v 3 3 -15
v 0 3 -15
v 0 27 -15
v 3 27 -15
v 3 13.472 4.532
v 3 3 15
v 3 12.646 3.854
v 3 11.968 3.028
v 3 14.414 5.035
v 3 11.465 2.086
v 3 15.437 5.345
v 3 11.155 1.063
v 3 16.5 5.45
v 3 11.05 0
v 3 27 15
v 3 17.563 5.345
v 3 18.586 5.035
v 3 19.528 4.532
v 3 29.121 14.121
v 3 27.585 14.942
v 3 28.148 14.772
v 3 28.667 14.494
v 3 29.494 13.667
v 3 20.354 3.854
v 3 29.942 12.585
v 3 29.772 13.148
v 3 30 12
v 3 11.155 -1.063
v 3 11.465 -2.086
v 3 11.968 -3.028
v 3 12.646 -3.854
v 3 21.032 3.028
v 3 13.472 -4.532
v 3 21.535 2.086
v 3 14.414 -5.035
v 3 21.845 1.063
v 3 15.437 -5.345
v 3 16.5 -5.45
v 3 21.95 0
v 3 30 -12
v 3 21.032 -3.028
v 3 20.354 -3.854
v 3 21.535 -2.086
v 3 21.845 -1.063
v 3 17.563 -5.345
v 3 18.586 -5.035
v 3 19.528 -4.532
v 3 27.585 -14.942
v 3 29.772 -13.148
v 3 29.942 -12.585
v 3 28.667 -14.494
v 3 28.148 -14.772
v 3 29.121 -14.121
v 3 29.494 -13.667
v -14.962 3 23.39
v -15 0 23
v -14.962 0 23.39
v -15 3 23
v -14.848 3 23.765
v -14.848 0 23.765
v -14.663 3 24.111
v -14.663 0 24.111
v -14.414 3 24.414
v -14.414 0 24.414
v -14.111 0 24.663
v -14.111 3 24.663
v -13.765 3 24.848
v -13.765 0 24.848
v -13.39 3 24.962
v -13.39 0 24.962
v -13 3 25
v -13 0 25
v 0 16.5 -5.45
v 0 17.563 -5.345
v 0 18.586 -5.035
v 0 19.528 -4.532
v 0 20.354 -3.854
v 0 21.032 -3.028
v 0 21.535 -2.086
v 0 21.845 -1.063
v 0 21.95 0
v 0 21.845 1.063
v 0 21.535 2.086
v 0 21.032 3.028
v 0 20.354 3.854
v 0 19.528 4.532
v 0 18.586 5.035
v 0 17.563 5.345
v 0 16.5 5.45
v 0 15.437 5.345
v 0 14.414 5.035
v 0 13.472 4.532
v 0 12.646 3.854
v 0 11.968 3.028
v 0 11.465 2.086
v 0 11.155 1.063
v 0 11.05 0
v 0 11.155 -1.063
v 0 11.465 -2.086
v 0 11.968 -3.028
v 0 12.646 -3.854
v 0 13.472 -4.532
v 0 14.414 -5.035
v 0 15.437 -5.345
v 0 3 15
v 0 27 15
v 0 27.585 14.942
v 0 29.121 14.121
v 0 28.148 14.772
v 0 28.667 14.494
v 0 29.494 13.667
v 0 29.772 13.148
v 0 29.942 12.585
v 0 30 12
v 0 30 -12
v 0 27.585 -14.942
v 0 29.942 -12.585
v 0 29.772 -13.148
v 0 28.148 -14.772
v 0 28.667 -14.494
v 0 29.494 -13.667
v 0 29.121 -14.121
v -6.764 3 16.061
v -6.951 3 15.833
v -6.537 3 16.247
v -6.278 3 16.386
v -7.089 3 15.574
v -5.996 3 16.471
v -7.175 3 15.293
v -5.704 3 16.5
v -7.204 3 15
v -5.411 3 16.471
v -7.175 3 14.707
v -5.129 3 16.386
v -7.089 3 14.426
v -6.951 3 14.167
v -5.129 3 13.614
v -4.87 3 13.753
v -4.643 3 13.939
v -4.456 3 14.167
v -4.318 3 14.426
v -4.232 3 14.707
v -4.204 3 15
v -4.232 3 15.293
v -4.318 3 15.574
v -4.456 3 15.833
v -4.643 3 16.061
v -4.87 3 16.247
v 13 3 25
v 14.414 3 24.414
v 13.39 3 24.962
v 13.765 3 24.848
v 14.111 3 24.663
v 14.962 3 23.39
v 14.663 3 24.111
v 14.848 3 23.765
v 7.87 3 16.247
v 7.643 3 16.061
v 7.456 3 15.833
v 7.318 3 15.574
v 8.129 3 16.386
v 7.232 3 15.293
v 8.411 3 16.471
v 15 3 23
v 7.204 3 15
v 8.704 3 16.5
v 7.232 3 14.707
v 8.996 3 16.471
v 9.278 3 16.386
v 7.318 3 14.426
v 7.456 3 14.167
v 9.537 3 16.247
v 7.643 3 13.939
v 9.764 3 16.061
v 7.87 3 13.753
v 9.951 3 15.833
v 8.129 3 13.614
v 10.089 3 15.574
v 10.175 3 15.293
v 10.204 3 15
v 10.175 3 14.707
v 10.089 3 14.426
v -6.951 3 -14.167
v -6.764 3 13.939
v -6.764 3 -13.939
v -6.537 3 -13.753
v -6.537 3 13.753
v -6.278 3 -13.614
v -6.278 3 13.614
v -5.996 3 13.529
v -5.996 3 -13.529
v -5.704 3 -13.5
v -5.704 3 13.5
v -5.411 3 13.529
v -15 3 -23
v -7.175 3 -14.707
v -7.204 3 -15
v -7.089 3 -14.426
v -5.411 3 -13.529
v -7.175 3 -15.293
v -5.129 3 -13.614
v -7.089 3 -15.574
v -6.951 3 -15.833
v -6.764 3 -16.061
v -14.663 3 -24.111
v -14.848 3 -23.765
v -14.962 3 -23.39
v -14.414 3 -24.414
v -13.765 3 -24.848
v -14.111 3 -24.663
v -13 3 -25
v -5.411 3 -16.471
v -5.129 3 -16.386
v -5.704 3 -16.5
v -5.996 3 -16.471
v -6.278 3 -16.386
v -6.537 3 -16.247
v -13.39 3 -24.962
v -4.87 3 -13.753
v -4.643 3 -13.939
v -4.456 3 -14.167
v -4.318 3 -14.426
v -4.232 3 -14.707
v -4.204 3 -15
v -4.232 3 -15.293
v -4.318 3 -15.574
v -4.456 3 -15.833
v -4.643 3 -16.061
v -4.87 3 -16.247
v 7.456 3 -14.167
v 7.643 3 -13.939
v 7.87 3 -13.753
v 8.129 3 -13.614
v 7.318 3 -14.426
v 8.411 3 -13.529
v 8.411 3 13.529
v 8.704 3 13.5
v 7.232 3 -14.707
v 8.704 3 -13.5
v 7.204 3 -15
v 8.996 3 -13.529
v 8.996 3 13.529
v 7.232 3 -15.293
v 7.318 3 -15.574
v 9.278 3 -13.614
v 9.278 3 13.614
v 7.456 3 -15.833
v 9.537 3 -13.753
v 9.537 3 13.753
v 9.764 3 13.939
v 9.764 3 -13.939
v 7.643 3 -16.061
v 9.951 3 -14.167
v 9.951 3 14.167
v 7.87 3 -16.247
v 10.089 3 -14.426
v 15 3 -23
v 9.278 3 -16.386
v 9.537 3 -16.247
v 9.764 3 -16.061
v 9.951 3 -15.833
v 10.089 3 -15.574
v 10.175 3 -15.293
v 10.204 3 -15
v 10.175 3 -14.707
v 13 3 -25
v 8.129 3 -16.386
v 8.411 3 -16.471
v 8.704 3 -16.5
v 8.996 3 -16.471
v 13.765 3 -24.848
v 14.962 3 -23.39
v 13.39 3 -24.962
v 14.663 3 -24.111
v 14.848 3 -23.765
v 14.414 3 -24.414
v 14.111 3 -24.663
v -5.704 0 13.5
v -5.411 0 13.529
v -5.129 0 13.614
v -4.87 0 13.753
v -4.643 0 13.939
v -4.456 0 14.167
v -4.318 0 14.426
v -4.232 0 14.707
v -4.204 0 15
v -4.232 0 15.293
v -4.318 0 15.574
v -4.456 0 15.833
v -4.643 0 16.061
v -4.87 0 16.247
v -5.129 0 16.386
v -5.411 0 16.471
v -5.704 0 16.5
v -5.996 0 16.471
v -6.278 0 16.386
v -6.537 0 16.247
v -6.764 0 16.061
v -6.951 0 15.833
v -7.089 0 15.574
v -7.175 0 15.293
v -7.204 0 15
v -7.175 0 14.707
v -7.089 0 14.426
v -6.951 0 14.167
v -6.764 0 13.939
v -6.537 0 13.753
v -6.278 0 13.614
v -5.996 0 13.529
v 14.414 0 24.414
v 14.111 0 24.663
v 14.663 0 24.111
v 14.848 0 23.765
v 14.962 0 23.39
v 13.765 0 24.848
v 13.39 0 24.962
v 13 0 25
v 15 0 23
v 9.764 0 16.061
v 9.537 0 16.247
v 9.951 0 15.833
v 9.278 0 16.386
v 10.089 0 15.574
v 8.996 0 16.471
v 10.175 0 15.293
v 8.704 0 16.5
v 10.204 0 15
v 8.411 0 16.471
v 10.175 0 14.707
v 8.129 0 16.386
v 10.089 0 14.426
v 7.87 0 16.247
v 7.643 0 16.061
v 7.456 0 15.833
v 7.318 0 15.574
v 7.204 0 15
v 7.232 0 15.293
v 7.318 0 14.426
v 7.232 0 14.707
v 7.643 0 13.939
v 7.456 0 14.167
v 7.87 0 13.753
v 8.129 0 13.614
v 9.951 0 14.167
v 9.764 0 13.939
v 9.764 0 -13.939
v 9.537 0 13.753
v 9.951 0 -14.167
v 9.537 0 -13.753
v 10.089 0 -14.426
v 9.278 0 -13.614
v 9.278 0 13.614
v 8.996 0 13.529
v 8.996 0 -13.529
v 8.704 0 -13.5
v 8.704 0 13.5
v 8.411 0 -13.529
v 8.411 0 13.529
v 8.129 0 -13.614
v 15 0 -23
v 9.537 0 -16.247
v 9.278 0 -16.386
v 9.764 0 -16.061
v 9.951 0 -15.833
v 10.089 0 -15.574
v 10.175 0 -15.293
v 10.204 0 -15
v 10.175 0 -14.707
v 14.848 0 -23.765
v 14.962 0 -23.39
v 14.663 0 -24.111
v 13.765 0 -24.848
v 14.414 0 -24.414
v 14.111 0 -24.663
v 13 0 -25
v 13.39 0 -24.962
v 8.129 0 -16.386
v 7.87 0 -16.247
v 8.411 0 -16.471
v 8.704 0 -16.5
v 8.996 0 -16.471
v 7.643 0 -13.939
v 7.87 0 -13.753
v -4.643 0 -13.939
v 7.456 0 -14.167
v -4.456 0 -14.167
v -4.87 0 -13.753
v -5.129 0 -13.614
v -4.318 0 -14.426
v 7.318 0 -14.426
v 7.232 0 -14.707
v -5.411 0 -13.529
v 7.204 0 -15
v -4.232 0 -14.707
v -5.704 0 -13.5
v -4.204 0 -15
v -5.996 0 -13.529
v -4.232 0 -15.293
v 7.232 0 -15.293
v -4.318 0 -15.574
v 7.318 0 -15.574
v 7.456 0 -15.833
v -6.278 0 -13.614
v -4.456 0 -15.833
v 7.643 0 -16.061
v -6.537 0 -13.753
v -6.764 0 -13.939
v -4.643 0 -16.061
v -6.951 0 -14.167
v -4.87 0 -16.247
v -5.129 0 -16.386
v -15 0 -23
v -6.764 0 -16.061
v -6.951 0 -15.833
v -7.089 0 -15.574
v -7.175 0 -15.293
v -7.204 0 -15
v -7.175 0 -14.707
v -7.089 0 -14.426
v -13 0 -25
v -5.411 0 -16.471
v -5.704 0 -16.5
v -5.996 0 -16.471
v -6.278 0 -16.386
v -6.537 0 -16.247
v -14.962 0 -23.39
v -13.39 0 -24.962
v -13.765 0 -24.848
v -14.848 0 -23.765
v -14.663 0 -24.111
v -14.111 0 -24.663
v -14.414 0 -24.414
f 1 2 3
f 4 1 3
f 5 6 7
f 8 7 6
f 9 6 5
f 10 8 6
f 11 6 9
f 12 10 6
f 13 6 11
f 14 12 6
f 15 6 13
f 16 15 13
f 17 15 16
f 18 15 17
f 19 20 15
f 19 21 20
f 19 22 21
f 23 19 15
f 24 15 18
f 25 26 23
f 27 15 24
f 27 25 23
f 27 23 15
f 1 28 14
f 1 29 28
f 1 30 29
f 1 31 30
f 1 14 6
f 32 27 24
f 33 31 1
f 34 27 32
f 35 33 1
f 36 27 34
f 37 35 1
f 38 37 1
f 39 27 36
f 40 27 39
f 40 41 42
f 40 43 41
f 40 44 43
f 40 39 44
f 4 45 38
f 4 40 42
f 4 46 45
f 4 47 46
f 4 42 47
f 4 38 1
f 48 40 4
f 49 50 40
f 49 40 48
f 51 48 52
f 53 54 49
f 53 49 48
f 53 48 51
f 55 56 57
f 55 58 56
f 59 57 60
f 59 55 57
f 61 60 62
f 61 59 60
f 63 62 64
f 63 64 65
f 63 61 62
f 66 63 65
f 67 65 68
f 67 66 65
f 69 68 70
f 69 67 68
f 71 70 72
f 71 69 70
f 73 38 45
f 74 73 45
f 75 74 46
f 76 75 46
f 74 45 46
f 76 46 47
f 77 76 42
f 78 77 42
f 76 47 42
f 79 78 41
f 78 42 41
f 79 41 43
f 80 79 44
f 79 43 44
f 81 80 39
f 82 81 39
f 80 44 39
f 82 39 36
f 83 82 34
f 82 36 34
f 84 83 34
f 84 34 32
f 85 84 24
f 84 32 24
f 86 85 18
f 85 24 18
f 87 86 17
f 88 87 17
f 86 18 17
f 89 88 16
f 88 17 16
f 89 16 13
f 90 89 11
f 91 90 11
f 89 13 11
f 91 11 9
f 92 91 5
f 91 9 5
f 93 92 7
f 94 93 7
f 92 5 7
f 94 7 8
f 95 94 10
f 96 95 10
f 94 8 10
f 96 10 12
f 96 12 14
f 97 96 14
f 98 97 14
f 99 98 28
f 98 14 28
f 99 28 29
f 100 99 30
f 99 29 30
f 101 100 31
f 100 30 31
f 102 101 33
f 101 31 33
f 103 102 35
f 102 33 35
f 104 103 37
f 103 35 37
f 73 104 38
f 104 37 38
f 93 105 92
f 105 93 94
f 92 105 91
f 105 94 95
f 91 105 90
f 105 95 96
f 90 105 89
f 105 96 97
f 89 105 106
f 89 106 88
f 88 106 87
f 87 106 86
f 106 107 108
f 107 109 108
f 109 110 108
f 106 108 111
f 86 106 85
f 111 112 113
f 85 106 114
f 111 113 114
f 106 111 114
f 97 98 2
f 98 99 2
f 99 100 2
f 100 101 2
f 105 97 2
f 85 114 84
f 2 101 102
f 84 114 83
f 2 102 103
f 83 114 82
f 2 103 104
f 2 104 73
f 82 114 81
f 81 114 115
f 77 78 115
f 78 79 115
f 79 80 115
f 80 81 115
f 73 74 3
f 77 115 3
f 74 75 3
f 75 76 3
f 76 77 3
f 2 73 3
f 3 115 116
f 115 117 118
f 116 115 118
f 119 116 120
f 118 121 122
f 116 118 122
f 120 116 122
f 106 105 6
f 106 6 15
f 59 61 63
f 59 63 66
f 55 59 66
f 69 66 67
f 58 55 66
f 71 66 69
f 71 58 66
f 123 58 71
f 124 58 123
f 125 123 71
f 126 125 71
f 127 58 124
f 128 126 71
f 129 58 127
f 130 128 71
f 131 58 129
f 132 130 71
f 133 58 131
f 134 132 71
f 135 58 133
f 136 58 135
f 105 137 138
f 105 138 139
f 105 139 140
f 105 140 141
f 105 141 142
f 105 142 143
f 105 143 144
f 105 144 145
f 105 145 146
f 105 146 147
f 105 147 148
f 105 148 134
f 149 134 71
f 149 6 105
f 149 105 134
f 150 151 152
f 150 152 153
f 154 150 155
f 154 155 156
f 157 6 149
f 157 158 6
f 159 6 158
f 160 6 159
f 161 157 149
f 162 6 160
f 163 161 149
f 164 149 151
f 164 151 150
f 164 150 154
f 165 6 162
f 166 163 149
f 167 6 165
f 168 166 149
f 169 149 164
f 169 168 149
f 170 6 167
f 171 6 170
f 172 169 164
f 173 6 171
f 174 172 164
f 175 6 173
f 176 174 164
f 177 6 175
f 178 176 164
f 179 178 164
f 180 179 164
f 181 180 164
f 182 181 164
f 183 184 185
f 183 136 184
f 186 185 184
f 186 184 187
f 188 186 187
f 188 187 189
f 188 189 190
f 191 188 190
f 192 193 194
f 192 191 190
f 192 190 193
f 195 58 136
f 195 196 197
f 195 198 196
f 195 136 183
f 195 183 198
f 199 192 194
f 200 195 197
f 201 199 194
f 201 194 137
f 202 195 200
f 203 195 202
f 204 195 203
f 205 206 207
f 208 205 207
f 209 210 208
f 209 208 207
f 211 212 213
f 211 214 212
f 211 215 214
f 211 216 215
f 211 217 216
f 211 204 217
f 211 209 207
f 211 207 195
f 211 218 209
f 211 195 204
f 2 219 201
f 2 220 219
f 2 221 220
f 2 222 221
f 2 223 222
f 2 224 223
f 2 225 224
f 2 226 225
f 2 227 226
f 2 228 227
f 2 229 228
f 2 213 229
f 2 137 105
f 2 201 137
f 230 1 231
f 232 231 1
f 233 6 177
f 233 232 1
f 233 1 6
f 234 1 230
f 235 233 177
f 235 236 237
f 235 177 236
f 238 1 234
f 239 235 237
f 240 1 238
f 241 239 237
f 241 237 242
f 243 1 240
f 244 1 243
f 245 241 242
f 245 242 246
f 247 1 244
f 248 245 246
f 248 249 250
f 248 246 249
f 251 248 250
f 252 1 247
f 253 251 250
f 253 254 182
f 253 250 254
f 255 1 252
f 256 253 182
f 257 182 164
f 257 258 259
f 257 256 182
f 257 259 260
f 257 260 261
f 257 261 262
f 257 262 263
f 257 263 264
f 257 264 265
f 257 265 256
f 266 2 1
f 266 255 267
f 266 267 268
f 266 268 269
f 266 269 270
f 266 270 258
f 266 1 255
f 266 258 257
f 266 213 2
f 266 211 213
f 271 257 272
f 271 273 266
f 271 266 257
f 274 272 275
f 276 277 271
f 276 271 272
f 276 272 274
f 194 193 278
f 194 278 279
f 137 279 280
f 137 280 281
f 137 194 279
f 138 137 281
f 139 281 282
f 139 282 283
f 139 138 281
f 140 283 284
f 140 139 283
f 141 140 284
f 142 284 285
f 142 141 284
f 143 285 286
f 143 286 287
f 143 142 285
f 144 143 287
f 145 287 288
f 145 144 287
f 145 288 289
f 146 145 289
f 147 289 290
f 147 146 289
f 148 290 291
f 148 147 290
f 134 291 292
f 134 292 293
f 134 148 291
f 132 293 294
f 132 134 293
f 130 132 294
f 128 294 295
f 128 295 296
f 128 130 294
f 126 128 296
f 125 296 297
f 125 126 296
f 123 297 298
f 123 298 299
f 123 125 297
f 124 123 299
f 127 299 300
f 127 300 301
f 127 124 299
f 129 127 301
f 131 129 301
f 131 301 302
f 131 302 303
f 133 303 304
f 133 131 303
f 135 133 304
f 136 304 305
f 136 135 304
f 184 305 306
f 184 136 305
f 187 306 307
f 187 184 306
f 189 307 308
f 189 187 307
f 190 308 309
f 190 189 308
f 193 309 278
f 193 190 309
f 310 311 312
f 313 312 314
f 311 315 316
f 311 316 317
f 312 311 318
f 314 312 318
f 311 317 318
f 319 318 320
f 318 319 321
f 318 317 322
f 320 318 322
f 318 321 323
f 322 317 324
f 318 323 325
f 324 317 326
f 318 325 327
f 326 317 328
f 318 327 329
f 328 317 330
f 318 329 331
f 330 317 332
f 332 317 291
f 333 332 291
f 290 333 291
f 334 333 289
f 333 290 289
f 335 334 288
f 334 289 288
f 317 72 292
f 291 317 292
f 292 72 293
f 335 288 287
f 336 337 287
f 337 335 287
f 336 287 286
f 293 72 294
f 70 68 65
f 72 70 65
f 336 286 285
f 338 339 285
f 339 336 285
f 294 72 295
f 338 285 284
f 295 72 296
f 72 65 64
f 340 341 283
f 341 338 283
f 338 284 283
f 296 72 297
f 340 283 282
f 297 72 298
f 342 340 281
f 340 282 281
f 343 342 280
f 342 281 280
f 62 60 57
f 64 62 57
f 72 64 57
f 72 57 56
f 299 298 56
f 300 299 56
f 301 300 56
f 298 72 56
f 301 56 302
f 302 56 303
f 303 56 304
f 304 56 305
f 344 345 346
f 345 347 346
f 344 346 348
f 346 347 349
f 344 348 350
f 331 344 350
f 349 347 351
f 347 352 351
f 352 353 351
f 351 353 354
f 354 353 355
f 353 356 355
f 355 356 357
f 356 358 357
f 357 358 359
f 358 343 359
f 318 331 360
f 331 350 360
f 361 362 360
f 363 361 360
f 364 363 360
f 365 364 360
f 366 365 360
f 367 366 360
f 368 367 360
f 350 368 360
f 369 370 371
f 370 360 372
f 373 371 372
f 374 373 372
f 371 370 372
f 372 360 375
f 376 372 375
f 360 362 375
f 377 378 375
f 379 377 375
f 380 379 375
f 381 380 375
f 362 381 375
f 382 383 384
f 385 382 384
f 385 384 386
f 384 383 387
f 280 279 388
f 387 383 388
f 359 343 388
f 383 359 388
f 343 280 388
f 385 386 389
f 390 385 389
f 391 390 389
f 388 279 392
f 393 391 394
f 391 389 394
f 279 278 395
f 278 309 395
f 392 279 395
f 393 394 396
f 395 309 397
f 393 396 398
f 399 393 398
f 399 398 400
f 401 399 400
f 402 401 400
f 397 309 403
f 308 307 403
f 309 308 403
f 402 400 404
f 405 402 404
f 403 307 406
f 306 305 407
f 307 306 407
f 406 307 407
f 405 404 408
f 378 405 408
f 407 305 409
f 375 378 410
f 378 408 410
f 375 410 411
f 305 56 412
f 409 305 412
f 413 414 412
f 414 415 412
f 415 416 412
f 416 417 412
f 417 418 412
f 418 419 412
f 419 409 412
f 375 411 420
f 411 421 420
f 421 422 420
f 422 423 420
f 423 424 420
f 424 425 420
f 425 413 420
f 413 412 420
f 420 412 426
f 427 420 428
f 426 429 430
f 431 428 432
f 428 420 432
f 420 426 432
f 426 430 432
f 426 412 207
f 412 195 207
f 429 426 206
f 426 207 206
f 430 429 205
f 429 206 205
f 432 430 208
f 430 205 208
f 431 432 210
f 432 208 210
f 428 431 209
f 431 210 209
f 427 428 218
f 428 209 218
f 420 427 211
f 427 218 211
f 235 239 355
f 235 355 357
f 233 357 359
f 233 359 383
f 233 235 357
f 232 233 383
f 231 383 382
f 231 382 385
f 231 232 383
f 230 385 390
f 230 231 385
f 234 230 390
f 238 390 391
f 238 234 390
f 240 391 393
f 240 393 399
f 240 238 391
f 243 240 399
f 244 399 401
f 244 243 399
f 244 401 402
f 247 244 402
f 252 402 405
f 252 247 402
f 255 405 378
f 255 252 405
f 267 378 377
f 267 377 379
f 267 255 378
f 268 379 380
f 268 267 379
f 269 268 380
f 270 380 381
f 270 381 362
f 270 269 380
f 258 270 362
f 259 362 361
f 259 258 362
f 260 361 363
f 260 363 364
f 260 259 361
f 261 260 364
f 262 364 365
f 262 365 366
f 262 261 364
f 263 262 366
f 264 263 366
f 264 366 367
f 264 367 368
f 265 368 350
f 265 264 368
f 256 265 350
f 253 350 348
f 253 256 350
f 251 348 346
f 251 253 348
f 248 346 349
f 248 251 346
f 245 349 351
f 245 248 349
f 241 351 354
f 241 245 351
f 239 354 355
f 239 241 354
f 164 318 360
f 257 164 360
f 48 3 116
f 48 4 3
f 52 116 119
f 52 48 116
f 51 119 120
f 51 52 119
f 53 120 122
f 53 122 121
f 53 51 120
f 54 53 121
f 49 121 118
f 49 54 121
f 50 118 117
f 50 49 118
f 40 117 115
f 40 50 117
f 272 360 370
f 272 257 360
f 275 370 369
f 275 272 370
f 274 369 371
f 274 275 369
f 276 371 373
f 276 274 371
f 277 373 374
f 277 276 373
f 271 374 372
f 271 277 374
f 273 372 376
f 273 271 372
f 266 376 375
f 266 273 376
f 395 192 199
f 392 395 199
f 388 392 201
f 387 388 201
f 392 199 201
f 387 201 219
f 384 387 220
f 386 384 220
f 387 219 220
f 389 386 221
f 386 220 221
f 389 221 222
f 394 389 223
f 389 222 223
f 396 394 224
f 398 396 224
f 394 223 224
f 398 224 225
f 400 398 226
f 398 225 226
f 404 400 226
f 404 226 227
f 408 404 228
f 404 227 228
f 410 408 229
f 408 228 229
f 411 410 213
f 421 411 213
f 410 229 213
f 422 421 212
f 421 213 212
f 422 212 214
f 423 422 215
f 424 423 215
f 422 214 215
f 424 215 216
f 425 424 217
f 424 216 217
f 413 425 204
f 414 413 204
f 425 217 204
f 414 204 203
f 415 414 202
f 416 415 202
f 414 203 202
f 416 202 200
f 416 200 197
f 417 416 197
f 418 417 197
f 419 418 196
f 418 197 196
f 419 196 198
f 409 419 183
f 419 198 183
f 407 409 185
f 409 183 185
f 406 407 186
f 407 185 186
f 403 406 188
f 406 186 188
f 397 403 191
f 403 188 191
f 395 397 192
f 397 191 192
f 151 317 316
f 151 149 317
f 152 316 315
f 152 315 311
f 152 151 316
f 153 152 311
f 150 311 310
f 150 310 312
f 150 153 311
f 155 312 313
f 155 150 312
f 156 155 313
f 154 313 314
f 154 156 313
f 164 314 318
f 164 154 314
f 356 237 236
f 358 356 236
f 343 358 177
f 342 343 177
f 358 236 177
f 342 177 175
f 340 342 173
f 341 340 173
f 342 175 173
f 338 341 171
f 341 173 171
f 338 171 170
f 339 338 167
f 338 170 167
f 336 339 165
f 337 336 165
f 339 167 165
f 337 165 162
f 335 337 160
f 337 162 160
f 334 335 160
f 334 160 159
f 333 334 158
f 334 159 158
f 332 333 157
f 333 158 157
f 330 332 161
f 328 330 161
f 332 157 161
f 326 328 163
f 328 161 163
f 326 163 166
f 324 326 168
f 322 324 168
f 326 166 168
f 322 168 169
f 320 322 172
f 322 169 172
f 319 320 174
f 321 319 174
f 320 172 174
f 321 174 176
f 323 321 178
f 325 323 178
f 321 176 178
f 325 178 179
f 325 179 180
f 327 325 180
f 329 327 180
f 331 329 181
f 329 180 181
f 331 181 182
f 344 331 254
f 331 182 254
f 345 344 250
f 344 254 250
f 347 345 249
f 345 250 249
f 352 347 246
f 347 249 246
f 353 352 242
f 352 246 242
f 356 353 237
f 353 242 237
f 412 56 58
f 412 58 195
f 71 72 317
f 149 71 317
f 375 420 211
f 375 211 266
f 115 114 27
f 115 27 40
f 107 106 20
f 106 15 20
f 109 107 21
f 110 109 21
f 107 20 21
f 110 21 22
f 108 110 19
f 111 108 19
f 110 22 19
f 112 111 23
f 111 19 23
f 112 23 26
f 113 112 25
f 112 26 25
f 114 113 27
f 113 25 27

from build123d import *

# Parameters (mm, degrees)
SKETCH_1_W               = 30
SKETCH_1_H               = 50
EXTRUDE_1_DEPTH          = 3
SKETCH_2_W               = 30
SKETCH_2_H               = 30
EXTRUDE_2_DEPTH          = 3
SKETCH_3_R               = 5.45
CUT_EXTRUDE_1_DEPTH      = 3
FILLET_1_R               = 2
FILLET_2_R               = 3
SKETCH_4_R               = 1.5
CUT_EXTRUDE_2_DEPTH      = 3
MIRROR_2_COPY_1_SKETCH_R = 1.5
MIRROR_2_COPY_1_DEPTH    = 3


with BuildPart() as part:
    # 草图1 → 凸台-拉伸1 (new body)
    with BuildSketch(Plane(origin=(0, 0, 0), x_dir=(1, 0, 0), z_dir=(0, 1, 0))):
        Rectangle(SKETCH_1_W, SKETCH_1_H)
    extrude(amount=EXTRUDE_1_DEPTH)

    # 草图2 → 凸台-拉伸2 (add)
    with BuildSketch(Plane(origin=(0, 0, 0), x_dir=(0, 0, -1), z_dir=(1, 0, 0))):
        with Locations((0, 15)):
            Rectangle(SKETCH_2_W, SKETCH_2_H)
    extrude(amount=EXTRUDE_2_DEPTH)

    # 草图3 → 切除-拉伸1 (cut)
    with BuildSketch(Plane(origin=(3, 0, 0), x_dir=(0, 0, -1), z_dir=(1, 0, 0))):
        with Locations((0, 16.5)):
            Circle(SKETCH_3_R)
    extrude(amount=-CUT_EXTRUDE_1_DEPTH, mode=Mode.SUBTRACT)

    # 圆角1
    fillet_1_edges = [part.edges().sort_by_distance(p)[0] for p in [
        (-15, 1.5, -25),
        (15, 1.5, -25),
        (15, 1.5, 25),
        (-15, 1.5, 25),
    ]]
    fillet(fillet_1_edges, radius=FILLET_1_R)

    # 圆角2
    fillet_2_edges = [part.edges().sort_by_distance(p)[0] for p in [
        (1.5, 30, 15),
        (1.5, 30, -15),
    ]]
    fillet(fillet_2_edges, radius=FILLET_2_R)

    # 草图4 → 切除-拉伸2 (cut)
    with BuildSketch(Plane(origin=(0, 3, 0), x_dir=(1, 0, 0), z_dir=(0, 1, 0))):
        with Locations(Location((-5.70350483, 15, 0), (0, 0, 270))):
            Circle(SKETCH_4_R)
    cut_extrude_2 = extrude(amount=-CUT_EXTRUDE_2_DEPTH, mode=Mode.SUBTRACT)

    # 镜向1: 切除-拉伸2 across plane
    add(cut_extrude_2.mirror(Plane.XY), mode=Mode.SUBTRACT)

    # 镜向2: 切除-拉伸2 across plane
    add(cut_extrude_2.mirror(Plane(origin=(1.5, 0, 0), x_dir=(0, 0, 1), z_dir=(1, 0, 0))), mode=Mode.SUBTRACT)

    # 镜向2 copy 1 sketch → 镜向2 copy 1 (cut)
    with BuildSketch(Plane(origin=(3, 3, 0), x_dir=(-1, 0, 0), z_dir=(0, 1, 0))):
        with Locations(Location((-5.70350483, 15, 0), (0, 0, 270))):
            Circle(MIRROR_2_COPY_1_SKETCH_R)
    extrude(amount=-MIRROR_2_COPY_1_DEPTH, mode=Mode.SUBTRACT)


solid = part.part
